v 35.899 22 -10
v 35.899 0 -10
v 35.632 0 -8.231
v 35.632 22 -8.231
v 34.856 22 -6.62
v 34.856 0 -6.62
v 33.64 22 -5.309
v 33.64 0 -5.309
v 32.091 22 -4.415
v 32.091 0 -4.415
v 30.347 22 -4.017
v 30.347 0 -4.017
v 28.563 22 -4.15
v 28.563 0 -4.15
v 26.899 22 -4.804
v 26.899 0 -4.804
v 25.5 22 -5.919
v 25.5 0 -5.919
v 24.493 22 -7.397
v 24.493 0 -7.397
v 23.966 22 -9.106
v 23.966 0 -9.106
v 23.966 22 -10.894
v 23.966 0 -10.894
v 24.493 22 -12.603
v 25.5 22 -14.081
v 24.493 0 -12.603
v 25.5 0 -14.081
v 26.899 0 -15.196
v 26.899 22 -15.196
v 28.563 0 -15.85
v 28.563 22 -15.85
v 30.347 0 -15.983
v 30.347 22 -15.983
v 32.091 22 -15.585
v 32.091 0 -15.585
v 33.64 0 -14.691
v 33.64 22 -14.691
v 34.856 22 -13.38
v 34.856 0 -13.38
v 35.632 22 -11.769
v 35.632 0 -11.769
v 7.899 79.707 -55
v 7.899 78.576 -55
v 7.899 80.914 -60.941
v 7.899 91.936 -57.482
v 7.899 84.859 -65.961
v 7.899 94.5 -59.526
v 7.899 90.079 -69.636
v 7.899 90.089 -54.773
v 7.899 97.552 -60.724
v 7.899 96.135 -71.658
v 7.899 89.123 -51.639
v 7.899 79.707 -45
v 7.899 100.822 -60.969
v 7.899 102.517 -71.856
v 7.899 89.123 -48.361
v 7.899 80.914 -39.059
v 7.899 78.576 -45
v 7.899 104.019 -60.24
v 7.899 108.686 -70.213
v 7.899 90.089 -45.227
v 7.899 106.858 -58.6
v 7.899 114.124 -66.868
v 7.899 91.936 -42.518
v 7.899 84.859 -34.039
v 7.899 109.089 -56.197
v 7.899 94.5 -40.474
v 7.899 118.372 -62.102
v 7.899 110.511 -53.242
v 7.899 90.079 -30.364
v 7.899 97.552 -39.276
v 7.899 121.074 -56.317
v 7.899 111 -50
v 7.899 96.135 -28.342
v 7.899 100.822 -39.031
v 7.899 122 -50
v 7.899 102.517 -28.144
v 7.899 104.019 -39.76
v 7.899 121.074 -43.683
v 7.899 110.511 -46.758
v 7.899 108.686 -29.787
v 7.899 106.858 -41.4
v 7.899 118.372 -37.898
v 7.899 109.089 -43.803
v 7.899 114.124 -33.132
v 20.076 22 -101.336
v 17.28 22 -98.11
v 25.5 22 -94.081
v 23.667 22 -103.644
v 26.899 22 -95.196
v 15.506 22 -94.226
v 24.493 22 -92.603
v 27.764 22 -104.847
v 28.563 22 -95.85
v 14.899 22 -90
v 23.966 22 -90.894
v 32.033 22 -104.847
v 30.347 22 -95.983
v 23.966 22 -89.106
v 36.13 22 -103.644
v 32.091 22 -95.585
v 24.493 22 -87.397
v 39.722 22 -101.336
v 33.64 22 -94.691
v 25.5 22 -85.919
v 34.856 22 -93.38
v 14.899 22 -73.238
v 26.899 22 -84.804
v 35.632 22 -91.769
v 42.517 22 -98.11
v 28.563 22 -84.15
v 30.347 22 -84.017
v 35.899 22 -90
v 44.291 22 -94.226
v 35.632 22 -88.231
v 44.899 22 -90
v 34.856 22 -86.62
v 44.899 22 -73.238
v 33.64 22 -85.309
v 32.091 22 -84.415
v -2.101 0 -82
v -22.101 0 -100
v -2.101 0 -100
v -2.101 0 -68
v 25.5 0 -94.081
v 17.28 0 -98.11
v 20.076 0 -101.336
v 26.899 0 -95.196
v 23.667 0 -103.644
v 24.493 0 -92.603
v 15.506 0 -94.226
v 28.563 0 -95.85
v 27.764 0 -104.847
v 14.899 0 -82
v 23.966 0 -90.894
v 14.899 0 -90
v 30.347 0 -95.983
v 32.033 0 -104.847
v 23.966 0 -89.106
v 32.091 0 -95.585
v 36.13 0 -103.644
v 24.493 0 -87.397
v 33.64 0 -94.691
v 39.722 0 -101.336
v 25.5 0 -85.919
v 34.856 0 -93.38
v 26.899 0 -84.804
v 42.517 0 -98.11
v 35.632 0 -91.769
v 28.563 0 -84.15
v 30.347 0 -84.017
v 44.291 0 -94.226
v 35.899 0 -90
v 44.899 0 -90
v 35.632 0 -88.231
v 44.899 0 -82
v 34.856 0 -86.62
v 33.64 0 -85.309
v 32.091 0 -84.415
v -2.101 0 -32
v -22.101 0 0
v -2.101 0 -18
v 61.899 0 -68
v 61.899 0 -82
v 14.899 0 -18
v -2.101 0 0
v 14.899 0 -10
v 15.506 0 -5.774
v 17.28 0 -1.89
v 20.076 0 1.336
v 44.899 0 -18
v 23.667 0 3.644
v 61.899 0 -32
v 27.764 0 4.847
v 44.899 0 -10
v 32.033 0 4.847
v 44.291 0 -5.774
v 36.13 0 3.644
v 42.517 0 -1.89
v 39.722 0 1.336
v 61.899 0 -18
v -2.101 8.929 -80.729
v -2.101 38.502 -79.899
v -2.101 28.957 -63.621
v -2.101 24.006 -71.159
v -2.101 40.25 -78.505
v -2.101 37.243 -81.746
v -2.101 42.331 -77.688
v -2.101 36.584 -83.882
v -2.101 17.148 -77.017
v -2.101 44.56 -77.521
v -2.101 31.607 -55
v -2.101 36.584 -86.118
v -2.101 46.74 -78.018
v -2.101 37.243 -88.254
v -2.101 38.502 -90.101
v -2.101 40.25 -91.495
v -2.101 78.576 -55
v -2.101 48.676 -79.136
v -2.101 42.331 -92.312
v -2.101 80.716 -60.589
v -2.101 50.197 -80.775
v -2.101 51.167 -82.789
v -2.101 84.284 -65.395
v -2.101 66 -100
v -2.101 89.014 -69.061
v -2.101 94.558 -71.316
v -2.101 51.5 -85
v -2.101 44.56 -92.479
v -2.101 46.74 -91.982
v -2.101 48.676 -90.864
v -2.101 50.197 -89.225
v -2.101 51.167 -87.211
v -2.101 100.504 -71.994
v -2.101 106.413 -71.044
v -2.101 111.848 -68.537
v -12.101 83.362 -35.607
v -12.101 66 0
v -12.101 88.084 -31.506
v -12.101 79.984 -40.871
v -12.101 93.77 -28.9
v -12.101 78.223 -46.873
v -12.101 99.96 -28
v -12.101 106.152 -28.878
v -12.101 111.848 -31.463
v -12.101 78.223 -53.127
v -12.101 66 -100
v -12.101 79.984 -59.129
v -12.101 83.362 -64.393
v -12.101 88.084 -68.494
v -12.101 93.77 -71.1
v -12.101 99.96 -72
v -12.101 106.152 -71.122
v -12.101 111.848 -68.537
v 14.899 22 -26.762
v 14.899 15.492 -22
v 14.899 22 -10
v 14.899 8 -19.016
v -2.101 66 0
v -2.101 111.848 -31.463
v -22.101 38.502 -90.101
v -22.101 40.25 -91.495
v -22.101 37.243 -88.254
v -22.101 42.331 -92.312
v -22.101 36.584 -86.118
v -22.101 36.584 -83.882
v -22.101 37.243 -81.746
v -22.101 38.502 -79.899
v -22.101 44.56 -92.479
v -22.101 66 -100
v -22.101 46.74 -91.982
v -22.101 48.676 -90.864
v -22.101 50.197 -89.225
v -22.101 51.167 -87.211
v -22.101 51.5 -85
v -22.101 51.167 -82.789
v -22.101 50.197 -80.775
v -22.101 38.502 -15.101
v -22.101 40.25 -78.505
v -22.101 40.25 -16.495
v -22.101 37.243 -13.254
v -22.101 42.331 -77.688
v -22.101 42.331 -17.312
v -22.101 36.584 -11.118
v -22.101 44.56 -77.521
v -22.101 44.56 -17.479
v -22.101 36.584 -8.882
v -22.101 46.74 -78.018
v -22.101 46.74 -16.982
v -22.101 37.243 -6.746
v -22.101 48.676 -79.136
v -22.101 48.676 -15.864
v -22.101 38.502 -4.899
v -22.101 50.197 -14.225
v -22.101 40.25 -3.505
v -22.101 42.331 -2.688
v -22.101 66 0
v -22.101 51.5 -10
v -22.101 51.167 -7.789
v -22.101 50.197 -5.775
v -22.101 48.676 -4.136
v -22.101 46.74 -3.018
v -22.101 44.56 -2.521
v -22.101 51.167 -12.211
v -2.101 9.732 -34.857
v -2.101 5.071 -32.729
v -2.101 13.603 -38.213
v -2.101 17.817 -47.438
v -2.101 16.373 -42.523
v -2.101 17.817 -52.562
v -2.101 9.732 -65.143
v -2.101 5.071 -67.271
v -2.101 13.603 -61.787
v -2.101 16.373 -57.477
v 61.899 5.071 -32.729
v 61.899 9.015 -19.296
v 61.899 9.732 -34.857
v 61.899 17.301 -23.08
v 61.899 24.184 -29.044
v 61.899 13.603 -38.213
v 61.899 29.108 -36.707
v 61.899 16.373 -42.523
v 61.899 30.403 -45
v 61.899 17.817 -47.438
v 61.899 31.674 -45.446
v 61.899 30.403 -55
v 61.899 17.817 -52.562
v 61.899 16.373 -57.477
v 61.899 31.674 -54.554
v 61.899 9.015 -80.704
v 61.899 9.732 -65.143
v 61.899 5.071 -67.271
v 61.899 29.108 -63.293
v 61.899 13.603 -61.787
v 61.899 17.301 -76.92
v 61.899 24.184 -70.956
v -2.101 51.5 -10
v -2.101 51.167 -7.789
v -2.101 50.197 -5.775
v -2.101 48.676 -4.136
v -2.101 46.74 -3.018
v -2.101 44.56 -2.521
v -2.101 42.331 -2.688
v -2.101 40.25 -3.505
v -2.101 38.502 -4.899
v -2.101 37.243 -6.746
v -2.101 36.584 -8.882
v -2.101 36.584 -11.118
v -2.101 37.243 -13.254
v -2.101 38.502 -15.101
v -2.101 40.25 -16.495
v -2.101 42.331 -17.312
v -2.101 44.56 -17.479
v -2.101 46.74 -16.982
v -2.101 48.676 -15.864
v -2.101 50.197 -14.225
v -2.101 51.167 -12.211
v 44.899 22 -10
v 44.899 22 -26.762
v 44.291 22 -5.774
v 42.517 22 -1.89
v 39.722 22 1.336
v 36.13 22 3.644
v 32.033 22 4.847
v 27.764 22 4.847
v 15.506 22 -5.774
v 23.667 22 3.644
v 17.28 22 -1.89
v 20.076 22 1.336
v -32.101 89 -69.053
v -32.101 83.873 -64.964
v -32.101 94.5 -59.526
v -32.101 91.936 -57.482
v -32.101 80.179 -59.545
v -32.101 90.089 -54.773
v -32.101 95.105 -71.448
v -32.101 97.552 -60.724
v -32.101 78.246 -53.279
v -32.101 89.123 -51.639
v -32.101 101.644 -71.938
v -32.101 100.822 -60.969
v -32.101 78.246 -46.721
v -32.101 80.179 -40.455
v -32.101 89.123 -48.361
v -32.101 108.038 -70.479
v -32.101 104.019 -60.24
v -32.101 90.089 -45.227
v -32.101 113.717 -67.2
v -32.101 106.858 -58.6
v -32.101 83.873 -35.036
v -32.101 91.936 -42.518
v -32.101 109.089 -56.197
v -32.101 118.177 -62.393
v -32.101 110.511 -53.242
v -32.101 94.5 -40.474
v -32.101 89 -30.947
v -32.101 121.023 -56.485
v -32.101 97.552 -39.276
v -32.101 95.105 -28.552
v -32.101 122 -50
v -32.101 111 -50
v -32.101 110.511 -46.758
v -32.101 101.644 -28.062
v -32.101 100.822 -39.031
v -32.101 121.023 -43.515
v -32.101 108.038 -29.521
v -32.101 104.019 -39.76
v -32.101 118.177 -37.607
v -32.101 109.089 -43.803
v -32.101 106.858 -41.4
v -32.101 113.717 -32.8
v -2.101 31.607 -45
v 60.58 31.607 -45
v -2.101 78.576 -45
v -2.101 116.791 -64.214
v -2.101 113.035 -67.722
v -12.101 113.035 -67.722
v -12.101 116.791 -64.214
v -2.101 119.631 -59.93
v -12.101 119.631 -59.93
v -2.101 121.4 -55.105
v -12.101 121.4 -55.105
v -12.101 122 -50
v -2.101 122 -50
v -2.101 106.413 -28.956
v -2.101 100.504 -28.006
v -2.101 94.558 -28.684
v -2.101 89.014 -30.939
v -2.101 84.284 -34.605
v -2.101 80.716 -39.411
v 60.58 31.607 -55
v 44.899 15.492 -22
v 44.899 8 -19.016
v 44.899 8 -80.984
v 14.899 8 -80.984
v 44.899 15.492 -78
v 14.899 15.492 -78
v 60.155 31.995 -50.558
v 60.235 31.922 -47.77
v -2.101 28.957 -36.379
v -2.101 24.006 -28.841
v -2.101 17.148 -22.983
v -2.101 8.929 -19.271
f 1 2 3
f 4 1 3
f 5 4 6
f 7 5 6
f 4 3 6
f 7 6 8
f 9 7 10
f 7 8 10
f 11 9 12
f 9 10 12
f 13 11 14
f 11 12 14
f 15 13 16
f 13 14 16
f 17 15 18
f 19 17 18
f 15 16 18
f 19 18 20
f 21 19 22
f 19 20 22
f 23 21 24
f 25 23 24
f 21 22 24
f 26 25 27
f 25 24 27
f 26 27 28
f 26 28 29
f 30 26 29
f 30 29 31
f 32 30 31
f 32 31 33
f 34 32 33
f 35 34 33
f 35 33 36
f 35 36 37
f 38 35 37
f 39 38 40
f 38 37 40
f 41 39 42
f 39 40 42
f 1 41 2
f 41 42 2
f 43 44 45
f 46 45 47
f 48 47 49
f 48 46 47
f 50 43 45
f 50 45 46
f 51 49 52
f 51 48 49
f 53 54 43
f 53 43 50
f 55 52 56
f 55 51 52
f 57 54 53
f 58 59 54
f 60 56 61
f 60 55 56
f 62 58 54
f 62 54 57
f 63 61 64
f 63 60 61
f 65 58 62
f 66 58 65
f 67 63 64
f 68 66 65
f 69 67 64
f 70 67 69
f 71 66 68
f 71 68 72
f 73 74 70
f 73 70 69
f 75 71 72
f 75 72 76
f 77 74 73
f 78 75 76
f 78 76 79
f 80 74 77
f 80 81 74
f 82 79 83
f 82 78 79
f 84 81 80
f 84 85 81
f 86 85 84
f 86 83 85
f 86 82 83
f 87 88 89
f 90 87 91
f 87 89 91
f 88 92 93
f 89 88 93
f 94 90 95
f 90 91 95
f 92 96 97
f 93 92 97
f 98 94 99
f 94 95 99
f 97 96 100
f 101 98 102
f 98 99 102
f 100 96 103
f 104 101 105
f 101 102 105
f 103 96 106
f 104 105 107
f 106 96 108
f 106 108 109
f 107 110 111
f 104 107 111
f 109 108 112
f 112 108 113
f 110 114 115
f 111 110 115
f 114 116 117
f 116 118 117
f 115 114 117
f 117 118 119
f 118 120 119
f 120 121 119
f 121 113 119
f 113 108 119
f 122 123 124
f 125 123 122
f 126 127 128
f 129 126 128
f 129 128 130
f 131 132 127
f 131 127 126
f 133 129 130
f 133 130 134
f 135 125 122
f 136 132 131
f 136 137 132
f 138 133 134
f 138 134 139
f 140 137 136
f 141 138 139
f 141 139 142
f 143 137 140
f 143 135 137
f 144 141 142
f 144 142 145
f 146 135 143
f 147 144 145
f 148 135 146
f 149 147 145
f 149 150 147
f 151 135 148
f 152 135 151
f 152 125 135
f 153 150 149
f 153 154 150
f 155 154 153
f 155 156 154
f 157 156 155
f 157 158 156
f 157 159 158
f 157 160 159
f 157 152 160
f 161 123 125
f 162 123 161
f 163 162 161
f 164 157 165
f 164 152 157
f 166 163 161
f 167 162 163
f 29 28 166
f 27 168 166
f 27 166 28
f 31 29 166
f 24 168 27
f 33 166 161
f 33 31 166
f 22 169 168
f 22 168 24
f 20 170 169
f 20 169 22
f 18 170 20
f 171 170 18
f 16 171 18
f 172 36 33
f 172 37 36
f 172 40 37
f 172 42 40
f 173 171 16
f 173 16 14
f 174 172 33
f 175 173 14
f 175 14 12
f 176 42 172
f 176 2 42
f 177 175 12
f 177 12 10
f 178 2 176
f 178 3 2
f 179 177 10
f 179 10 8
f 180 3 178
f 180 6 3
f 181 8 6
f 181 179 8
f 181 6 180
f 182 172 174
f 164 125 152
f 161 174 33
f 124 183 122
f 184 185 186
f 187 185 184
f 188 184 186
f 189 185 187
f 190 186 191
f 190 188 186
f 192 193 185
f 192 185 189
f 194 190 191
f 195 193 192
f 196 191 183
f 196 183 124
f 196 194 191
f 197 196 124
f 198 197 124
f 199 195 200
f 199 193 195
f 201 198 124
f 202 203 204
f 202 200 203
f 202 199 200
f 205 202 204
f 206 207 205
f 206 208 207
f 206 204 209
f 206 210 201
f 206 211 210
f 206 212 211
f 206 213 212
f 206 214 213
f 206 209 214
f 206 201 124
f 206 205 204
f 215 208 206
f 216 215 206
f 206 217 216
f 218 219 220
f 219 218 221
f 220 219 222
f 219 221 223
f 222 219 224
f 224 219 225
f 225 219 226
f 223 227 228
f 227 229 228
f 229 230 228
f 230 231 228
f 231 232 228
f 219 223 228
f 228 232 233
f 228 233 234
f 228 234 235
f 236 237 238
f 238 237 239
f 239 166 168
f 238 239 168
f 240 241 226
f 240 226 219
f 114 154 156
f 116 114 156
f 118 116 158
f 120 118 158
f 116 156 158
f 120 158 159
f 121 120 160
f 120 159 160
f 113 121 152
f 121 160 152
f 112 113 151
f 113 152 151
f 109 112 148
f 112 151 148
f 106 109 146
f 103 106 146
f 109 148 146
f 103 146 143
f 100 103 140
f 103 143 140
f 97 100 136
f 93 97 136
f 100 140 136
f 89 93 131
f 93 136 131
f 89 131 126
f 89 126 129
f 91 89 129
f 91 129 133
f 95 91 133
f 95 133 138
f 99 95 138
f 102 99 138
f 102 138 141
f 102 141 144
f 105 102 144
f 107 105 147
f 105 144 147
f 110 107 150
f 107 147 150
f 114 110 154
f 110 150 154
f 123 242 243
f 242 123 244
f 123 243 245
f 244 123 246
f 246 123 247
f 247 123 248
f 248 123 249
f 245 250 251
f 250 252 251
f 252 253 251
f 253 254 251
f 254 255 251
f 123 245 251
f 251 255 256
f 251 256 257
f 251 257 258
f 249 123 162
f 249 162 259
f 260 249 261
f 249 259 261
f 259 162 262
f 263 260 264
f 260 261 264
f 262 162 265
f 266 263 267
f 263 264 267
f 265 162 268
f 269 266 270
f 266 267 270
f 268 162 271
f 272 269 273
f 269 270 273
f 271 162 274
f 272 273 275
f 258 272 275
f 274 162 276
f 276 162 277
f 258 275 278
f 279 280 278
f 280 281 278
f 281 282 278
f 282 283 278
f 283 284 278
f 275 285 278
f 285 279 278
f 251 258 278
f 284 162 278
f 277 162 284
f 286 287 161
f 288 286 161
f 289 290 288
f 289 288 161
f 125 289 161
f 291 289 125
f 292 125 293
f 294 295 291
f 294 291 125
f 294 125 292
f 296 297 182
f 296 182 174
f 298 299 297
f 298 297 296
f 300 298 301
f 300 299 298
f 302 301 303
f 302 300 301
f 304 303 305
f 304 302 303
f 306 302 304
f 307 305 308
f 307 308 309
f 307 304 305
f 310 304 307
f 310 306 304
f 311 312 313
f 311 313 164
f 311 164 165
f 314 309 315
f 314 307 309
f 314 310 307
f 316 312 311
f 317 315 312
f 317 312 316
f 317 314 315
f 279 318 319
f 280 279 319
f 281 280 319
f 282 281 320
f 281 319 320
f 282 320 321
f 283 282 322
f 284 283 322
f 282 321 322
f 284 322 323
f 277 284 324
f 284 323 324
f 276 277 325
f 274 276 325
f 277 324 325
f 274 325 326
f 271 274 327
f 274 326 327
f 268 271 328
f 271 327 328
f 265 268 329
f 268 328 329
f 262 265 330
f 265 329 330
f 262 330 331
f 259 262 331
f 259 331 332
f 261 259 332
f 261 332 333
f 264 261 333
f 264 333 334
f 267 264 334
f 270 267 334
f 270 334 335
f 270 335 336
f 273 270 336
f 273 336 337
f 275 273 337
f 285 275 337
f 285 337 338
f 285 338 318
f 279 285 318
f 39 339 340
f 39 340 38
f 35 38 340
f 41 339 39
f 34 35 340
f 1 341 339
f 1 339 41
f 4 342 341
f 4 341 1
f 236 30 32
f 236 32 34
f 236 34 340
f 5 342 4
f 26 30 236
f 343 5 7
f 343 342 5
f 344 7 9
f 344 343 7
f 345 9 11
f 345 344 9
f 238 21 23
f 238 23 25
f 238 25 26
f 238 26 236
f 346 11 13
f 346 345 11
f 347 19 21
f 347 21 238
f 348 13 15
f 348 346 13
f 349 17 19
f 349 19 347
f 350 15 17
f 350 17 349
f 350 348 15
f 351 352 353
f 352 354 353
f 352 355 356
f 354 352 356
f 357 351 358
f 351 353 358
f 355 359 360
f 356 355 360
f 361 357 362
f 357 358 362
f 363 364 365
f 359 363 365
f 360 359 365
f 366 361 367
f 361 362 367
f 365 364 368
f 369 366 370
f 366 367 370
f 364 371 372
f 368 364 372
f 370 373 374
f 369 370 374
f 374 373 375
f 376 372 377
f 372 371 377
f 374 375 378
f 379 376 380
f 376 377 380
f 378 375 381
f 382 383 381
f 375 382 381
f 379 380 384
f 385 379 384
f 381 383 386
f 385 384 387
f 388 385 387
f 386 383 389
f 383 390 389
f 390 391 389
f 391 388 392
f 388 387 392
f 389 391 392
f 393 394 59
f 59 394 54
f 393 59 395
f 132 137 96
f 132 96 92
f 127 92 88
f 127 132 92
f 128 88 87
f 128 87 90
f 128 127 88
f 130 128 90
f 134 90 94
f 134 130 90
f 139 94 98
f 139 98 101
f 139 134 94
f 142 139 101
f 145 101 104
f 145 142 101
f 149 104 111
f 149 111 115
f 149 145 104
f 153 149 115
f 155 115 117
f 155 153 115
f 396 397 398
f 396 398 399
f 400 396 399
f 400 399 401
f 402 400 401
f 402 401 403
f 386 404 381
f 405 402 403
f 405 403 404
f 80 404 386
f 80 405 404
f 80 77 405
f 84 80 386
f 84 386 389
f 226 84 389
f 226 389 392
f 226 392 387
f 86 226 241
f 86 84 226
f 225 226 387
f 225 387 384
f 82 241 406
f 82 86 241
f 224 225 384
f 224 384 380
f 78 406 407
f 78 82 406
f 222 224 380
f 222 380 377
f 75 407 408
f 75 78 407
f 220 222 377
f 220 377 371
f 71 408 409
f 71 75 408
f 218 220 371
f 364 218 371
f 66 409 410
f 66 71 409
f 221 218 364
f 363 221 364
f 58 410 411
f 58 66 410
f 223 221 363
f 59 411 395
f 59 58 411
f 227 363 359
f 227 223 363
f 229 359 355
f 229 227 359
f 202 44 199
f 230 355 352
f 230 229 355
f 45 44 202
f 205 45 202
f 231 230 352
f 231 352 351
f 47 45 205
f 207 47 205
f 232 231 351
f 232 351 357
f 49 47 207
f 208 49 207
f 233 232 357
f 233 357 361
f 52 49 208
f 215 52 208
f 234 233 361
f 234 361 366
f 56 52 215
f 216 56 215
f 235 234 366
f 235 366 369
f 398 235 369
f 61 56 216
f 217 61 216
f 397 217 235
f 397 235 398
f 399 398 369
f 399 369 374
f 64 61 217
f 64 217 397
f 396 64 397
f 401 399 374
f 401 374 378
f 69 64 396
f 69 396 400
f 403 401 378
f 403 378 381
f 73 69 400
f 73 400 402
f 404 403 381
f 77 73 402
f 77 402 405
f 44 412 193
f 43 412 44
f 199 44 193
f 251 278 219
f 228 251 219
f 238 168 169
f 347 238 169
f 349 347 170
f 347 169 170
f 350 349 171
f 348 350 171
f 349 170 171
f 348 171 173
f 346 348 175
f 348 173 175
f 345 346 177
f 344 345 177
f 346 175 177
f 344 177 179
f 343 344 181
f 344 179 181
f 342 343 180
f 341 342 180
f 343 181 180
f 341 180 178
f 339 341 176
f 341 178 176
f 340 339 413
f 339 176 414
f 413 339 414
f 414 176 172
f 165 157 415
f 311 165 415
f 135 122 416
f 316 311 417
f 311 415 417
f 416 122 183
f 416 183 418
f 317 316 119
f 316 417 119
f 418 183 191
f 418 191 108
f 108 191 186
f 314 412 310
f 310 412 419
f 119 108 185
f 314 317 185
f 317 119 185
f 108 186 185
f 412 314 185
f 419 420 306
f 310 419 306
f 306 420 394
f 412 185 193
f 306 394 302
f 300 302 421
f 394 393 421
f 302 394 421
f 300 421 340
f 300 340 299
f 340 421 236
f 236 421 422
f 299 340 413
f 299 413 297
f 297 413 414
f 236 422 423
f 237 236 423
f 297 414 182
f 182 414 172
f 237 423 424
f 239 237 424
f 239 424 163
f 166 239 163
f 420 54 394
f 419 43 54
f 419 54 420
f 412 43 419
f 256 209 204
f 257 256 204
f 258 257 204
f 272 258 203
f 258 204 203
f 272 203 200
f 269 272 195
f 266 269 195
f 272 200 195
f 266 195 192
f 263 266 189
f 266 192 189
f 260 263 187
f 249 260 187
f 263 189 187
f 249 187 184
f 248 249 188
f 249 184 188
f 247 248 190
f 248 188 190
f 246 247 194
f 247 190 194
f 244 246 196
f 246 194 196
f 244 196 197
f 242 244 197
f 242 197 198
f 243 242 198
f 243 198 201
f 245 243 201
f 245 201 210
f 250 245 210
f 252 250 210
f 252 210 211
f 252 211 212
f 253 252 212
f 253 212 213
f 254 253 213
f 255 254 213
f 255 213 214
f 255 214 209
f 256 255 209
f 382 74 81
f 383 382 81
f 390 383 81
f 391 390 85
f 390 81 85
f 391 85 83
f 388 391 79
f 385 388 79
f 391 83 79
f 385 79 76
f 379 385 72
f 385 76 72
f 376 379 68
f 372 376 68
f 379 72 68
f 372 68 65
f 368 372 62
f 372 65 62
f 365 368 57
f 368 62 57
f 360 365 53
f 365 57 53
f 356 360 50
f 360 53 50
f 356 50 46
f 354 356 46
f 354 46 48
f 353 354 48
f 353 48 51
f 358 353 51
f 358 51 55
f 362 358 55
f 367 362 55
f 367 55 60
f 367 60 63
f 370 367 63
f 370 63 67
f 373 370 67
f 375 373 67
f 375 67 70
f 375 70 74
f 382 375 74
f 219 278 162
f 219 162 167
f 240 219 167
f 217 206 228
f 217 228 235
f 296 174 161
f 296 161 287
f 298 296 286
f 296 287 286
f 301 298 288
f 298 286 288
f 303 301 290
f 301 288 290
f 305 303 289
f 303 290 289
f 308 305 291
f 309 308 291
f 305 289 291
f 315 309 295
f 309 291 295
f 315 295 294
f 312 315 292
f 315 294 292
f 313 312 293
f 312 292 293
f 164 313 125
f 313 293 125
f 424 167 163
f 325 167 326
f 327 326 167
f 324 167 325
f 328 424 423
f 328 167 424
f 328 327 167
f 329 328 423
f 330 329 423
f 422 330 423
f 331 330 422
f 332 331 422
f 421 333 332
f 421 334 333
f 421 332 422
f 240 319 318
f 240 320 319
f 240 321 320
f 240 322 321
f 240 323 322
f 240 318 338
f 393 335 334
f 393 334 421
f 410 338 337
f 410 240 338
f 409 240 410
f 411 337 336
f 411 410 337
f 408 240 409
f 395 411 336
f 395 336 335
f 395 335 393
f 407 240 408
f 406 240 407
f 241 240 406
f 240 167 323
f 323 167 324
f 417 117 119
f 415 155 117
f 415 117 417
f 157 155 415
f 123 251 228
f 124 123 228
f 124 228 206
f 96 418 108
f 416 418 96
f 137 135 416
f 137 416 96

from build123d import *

# Parameters (mm, degrees)
SKETCH2_W            = 20
SKETCH2_H            = 66
BOSS_EXTRUDE1_DEPTH  = 100
SKETCH3_R            = 11
BOSS_EXTRUDE2_DEPTH  = 10
BOSS_EXTRUDE3_START  = 10
SKETCH4_R            = 22
SKETCH4_R_2          = 11
BOSS_EXTRUDE3_DEPTH  = 10
SKETCH5_R            = 22
SKETCH5_R_2          = 11
BOSS_EXTRUDE4_DEPTH  = 40
BOSS_EXTRUDE5_DEPTH  = 64
BOSS_EXTRUDE10_DEPTH = 5
SKETCH16_R           = 6
BOSS_EXTRUDE11_DEPTH = 22
SKETCH18_R           = 7.5
CUT_EXTRUDE2_DEPTH   = 22


with BuildPart() as part:
    # Sketch2 → Boss-Extrude1 (new body)
    with BuildSketch(Plane.XY):
        with Locations((-12.101382488, 33)):
            Rectangle(SKETCH2_W, SKETCH2_H)
    extrude(amount=-BOSS_EXTRUDE1_DEPTH)

    # Sketch3 → Boss-Extrude2 (add)
    # profile 1 of 2: a face of its own
    with BuildSketch(Plane(origin=(-2.101382488, 0, 0), x_dir=(0, 0, -1), z_dir=(1, 0, 0))):
        with BuildLine():
            Line((31.462791547, 111.847864903), (0, 66))
            Line((0, 66), (100, 66))
            Line((100, 66), (68.537208453, 111.847864903))
            ThreePointArc((68.537208453, 111.847864903), (71.116564422, 106.171766928), (72, 100))
            ThreePointArc((72, 100), (43.828233072, 78.883435578), (31.462791547, 111.847864903))
        make_face()
    # profile 2 of 2: a face of its own
    with BuildSketch(Plane(origin=(-2.101382488, 0, 0), x_dir=(0, 0, -1), z_dir=(1, 0, 0))):
        with BuildLine():
            Line((32.277524622, 113.035101322), (31.462791547, 111.847864903))
            ThreePointArc((31.462791547, 111.847864903), (43.828233072, 78.883435578), (72, 100))
            ThreePointArc((72, 100), (71.116564422, 106.171766928), (68.537208453, 111.847864903))
            Line((68.537208453, 111.847864903), (67.722475378, 113.035101322))
            ThreePointArc((67.722475378, 113.035101322), (50, 122), (32.277524622, 113.035101322))
        make_face()
        with Locations(Location((50, 100, 0), (0, 0, 90))):
            Circle(SKETCH3_R, mode=Mode.SUBTRACT)
    extrude(amount=-BOSS_EXTRUDE2_DEPTH)

    # Sketch4 → Boss-Extrude3 (add)
    with BuildSketch(Plane(origin=(-2.101382488, 0, 0), x_dir=(0, 0, -1), z_dir=(1, 0, 0)).offset(BOSS_EXTRUDE3_START)):
        with Locations(Location((50, 100, 0), (0, 0, 90))):
            Circle(SKETCH4_R)
        with Locations(Location((50, 100, 0), (0, 0, 90))):
            Circle(SKETCH4_R_2, mode=Mode.SUBTRACT)
    extrude(amount=-BOSS_EXTRUDE3_DEPTH)

    # Sketch5 → Boss-Extrude4 (add)
    with BuildSketch(Plane(origin=(7.898617512, 0, 0), x_dir=(0, 0, -1), z_dir=(1, 0, 0))):
        with Locations(Location((50, 100, 0), (0, 0, 90))):
            Circle(SKETCH5_R)
        with Locations(Location((50, 100, 0), (0, 0, 90))):
            Circle(SKETCH5_R_2, mode=Mode.SUBTRACT)
    extrude(amount=-BOSS_EXTRUDE4_DEPTH)

    # Sketch6 → Boss-Extrude5 (add)
    with BuildSketch(Plane(origin=(-2.101382488, 0, 0), x_dir=(0, 0, -1), z_dir=(1, 0, 0))):
        with BuildLine():
            ThreePointArc((32, 0), (50, 18), (68, 0))
            Line((68, 0), (82, 0))
            ThreePointArc((82, 0), (50, 32), (18, 0))
            Line((18, 0), (32, 0))
        make_face()
    extrude(amount=BOSS_EXTRUDE5_DEPTH)

    # Sketch9 → Boss-Extrude10 (add, symmetric)
    with BuildSketch(Plane(origin=(0, 0, -50), x_dir=(-1, 0, 0), z_dir=(0, 0, -1))):
        Polygon((-61.898617512, 30.402989501), (4.356494358, 30.402989501), (4.356494358, 79.707135775), (-7.898617512, 79.707135775), align=None)
    extrude(amount=BOSS_EXTRUDE10_DEPTH, both=True)

    # Sketch16 → Boss-Extrude11 (add)
    # profile 1 of 2: a face of its own
    with BuildSketch(Plane.XZ):
        with BuildLine():
            Line((14.898617512, -32), (14.898617512, -10))
            ThreePointArc((14.898617512, -10), (29.898617512, 5), (44.898617512, -10))
            Line((44.898617512, -10), (44.898617512, -32))
            Line((44.898617512, -32), (14.898617512, -32))
        make_face()
        with Locations((29.898617512, -10)):
            Circle(SKETCH16_R, mode=Mode.SUBTRACT)
    # profile 2 of 2: a face of its own
    with BuildSketch(Plane.XZ):
        with BuildLine():
            Line((14.898617512, -68), (14.898617512, -90))
            ThreePointArc((14.898617512, -90), (29.898617512, -105), (44.898617512, -90))
            Line((44.898617512, -90), (44.898617512, -68))
            Line((44.898617512, -68), (14.898617512, -68))
        make_face()
        with Locations((29.898617512, -90)):
            Circle(SKETCH16_R, mode=Mode.SUBTRACT)
    extrude(amount=-BOSS_EXTRUDE11_DEPTH)

    # Sketch18 → Cut-Extrude2 (cut)
    with BuildSketch(Plane(origin=(-2.101382488, 0, 0), x_dir=(0, 0, -1), z_dir=(1, 0, 0))):
        with Locations(Location((10, 44, 0), (0, 0, 90))):
            Circle(SKETCH18_R)
        with Locations(Location((85, 44, 0), (0, 0, 90))):
            Circle(SKETCH18_R)
    extrude(amount=-CUT_EXTRUDE2_DEPTH, mode=Mode.SUBTRACT)


solid = part.part
